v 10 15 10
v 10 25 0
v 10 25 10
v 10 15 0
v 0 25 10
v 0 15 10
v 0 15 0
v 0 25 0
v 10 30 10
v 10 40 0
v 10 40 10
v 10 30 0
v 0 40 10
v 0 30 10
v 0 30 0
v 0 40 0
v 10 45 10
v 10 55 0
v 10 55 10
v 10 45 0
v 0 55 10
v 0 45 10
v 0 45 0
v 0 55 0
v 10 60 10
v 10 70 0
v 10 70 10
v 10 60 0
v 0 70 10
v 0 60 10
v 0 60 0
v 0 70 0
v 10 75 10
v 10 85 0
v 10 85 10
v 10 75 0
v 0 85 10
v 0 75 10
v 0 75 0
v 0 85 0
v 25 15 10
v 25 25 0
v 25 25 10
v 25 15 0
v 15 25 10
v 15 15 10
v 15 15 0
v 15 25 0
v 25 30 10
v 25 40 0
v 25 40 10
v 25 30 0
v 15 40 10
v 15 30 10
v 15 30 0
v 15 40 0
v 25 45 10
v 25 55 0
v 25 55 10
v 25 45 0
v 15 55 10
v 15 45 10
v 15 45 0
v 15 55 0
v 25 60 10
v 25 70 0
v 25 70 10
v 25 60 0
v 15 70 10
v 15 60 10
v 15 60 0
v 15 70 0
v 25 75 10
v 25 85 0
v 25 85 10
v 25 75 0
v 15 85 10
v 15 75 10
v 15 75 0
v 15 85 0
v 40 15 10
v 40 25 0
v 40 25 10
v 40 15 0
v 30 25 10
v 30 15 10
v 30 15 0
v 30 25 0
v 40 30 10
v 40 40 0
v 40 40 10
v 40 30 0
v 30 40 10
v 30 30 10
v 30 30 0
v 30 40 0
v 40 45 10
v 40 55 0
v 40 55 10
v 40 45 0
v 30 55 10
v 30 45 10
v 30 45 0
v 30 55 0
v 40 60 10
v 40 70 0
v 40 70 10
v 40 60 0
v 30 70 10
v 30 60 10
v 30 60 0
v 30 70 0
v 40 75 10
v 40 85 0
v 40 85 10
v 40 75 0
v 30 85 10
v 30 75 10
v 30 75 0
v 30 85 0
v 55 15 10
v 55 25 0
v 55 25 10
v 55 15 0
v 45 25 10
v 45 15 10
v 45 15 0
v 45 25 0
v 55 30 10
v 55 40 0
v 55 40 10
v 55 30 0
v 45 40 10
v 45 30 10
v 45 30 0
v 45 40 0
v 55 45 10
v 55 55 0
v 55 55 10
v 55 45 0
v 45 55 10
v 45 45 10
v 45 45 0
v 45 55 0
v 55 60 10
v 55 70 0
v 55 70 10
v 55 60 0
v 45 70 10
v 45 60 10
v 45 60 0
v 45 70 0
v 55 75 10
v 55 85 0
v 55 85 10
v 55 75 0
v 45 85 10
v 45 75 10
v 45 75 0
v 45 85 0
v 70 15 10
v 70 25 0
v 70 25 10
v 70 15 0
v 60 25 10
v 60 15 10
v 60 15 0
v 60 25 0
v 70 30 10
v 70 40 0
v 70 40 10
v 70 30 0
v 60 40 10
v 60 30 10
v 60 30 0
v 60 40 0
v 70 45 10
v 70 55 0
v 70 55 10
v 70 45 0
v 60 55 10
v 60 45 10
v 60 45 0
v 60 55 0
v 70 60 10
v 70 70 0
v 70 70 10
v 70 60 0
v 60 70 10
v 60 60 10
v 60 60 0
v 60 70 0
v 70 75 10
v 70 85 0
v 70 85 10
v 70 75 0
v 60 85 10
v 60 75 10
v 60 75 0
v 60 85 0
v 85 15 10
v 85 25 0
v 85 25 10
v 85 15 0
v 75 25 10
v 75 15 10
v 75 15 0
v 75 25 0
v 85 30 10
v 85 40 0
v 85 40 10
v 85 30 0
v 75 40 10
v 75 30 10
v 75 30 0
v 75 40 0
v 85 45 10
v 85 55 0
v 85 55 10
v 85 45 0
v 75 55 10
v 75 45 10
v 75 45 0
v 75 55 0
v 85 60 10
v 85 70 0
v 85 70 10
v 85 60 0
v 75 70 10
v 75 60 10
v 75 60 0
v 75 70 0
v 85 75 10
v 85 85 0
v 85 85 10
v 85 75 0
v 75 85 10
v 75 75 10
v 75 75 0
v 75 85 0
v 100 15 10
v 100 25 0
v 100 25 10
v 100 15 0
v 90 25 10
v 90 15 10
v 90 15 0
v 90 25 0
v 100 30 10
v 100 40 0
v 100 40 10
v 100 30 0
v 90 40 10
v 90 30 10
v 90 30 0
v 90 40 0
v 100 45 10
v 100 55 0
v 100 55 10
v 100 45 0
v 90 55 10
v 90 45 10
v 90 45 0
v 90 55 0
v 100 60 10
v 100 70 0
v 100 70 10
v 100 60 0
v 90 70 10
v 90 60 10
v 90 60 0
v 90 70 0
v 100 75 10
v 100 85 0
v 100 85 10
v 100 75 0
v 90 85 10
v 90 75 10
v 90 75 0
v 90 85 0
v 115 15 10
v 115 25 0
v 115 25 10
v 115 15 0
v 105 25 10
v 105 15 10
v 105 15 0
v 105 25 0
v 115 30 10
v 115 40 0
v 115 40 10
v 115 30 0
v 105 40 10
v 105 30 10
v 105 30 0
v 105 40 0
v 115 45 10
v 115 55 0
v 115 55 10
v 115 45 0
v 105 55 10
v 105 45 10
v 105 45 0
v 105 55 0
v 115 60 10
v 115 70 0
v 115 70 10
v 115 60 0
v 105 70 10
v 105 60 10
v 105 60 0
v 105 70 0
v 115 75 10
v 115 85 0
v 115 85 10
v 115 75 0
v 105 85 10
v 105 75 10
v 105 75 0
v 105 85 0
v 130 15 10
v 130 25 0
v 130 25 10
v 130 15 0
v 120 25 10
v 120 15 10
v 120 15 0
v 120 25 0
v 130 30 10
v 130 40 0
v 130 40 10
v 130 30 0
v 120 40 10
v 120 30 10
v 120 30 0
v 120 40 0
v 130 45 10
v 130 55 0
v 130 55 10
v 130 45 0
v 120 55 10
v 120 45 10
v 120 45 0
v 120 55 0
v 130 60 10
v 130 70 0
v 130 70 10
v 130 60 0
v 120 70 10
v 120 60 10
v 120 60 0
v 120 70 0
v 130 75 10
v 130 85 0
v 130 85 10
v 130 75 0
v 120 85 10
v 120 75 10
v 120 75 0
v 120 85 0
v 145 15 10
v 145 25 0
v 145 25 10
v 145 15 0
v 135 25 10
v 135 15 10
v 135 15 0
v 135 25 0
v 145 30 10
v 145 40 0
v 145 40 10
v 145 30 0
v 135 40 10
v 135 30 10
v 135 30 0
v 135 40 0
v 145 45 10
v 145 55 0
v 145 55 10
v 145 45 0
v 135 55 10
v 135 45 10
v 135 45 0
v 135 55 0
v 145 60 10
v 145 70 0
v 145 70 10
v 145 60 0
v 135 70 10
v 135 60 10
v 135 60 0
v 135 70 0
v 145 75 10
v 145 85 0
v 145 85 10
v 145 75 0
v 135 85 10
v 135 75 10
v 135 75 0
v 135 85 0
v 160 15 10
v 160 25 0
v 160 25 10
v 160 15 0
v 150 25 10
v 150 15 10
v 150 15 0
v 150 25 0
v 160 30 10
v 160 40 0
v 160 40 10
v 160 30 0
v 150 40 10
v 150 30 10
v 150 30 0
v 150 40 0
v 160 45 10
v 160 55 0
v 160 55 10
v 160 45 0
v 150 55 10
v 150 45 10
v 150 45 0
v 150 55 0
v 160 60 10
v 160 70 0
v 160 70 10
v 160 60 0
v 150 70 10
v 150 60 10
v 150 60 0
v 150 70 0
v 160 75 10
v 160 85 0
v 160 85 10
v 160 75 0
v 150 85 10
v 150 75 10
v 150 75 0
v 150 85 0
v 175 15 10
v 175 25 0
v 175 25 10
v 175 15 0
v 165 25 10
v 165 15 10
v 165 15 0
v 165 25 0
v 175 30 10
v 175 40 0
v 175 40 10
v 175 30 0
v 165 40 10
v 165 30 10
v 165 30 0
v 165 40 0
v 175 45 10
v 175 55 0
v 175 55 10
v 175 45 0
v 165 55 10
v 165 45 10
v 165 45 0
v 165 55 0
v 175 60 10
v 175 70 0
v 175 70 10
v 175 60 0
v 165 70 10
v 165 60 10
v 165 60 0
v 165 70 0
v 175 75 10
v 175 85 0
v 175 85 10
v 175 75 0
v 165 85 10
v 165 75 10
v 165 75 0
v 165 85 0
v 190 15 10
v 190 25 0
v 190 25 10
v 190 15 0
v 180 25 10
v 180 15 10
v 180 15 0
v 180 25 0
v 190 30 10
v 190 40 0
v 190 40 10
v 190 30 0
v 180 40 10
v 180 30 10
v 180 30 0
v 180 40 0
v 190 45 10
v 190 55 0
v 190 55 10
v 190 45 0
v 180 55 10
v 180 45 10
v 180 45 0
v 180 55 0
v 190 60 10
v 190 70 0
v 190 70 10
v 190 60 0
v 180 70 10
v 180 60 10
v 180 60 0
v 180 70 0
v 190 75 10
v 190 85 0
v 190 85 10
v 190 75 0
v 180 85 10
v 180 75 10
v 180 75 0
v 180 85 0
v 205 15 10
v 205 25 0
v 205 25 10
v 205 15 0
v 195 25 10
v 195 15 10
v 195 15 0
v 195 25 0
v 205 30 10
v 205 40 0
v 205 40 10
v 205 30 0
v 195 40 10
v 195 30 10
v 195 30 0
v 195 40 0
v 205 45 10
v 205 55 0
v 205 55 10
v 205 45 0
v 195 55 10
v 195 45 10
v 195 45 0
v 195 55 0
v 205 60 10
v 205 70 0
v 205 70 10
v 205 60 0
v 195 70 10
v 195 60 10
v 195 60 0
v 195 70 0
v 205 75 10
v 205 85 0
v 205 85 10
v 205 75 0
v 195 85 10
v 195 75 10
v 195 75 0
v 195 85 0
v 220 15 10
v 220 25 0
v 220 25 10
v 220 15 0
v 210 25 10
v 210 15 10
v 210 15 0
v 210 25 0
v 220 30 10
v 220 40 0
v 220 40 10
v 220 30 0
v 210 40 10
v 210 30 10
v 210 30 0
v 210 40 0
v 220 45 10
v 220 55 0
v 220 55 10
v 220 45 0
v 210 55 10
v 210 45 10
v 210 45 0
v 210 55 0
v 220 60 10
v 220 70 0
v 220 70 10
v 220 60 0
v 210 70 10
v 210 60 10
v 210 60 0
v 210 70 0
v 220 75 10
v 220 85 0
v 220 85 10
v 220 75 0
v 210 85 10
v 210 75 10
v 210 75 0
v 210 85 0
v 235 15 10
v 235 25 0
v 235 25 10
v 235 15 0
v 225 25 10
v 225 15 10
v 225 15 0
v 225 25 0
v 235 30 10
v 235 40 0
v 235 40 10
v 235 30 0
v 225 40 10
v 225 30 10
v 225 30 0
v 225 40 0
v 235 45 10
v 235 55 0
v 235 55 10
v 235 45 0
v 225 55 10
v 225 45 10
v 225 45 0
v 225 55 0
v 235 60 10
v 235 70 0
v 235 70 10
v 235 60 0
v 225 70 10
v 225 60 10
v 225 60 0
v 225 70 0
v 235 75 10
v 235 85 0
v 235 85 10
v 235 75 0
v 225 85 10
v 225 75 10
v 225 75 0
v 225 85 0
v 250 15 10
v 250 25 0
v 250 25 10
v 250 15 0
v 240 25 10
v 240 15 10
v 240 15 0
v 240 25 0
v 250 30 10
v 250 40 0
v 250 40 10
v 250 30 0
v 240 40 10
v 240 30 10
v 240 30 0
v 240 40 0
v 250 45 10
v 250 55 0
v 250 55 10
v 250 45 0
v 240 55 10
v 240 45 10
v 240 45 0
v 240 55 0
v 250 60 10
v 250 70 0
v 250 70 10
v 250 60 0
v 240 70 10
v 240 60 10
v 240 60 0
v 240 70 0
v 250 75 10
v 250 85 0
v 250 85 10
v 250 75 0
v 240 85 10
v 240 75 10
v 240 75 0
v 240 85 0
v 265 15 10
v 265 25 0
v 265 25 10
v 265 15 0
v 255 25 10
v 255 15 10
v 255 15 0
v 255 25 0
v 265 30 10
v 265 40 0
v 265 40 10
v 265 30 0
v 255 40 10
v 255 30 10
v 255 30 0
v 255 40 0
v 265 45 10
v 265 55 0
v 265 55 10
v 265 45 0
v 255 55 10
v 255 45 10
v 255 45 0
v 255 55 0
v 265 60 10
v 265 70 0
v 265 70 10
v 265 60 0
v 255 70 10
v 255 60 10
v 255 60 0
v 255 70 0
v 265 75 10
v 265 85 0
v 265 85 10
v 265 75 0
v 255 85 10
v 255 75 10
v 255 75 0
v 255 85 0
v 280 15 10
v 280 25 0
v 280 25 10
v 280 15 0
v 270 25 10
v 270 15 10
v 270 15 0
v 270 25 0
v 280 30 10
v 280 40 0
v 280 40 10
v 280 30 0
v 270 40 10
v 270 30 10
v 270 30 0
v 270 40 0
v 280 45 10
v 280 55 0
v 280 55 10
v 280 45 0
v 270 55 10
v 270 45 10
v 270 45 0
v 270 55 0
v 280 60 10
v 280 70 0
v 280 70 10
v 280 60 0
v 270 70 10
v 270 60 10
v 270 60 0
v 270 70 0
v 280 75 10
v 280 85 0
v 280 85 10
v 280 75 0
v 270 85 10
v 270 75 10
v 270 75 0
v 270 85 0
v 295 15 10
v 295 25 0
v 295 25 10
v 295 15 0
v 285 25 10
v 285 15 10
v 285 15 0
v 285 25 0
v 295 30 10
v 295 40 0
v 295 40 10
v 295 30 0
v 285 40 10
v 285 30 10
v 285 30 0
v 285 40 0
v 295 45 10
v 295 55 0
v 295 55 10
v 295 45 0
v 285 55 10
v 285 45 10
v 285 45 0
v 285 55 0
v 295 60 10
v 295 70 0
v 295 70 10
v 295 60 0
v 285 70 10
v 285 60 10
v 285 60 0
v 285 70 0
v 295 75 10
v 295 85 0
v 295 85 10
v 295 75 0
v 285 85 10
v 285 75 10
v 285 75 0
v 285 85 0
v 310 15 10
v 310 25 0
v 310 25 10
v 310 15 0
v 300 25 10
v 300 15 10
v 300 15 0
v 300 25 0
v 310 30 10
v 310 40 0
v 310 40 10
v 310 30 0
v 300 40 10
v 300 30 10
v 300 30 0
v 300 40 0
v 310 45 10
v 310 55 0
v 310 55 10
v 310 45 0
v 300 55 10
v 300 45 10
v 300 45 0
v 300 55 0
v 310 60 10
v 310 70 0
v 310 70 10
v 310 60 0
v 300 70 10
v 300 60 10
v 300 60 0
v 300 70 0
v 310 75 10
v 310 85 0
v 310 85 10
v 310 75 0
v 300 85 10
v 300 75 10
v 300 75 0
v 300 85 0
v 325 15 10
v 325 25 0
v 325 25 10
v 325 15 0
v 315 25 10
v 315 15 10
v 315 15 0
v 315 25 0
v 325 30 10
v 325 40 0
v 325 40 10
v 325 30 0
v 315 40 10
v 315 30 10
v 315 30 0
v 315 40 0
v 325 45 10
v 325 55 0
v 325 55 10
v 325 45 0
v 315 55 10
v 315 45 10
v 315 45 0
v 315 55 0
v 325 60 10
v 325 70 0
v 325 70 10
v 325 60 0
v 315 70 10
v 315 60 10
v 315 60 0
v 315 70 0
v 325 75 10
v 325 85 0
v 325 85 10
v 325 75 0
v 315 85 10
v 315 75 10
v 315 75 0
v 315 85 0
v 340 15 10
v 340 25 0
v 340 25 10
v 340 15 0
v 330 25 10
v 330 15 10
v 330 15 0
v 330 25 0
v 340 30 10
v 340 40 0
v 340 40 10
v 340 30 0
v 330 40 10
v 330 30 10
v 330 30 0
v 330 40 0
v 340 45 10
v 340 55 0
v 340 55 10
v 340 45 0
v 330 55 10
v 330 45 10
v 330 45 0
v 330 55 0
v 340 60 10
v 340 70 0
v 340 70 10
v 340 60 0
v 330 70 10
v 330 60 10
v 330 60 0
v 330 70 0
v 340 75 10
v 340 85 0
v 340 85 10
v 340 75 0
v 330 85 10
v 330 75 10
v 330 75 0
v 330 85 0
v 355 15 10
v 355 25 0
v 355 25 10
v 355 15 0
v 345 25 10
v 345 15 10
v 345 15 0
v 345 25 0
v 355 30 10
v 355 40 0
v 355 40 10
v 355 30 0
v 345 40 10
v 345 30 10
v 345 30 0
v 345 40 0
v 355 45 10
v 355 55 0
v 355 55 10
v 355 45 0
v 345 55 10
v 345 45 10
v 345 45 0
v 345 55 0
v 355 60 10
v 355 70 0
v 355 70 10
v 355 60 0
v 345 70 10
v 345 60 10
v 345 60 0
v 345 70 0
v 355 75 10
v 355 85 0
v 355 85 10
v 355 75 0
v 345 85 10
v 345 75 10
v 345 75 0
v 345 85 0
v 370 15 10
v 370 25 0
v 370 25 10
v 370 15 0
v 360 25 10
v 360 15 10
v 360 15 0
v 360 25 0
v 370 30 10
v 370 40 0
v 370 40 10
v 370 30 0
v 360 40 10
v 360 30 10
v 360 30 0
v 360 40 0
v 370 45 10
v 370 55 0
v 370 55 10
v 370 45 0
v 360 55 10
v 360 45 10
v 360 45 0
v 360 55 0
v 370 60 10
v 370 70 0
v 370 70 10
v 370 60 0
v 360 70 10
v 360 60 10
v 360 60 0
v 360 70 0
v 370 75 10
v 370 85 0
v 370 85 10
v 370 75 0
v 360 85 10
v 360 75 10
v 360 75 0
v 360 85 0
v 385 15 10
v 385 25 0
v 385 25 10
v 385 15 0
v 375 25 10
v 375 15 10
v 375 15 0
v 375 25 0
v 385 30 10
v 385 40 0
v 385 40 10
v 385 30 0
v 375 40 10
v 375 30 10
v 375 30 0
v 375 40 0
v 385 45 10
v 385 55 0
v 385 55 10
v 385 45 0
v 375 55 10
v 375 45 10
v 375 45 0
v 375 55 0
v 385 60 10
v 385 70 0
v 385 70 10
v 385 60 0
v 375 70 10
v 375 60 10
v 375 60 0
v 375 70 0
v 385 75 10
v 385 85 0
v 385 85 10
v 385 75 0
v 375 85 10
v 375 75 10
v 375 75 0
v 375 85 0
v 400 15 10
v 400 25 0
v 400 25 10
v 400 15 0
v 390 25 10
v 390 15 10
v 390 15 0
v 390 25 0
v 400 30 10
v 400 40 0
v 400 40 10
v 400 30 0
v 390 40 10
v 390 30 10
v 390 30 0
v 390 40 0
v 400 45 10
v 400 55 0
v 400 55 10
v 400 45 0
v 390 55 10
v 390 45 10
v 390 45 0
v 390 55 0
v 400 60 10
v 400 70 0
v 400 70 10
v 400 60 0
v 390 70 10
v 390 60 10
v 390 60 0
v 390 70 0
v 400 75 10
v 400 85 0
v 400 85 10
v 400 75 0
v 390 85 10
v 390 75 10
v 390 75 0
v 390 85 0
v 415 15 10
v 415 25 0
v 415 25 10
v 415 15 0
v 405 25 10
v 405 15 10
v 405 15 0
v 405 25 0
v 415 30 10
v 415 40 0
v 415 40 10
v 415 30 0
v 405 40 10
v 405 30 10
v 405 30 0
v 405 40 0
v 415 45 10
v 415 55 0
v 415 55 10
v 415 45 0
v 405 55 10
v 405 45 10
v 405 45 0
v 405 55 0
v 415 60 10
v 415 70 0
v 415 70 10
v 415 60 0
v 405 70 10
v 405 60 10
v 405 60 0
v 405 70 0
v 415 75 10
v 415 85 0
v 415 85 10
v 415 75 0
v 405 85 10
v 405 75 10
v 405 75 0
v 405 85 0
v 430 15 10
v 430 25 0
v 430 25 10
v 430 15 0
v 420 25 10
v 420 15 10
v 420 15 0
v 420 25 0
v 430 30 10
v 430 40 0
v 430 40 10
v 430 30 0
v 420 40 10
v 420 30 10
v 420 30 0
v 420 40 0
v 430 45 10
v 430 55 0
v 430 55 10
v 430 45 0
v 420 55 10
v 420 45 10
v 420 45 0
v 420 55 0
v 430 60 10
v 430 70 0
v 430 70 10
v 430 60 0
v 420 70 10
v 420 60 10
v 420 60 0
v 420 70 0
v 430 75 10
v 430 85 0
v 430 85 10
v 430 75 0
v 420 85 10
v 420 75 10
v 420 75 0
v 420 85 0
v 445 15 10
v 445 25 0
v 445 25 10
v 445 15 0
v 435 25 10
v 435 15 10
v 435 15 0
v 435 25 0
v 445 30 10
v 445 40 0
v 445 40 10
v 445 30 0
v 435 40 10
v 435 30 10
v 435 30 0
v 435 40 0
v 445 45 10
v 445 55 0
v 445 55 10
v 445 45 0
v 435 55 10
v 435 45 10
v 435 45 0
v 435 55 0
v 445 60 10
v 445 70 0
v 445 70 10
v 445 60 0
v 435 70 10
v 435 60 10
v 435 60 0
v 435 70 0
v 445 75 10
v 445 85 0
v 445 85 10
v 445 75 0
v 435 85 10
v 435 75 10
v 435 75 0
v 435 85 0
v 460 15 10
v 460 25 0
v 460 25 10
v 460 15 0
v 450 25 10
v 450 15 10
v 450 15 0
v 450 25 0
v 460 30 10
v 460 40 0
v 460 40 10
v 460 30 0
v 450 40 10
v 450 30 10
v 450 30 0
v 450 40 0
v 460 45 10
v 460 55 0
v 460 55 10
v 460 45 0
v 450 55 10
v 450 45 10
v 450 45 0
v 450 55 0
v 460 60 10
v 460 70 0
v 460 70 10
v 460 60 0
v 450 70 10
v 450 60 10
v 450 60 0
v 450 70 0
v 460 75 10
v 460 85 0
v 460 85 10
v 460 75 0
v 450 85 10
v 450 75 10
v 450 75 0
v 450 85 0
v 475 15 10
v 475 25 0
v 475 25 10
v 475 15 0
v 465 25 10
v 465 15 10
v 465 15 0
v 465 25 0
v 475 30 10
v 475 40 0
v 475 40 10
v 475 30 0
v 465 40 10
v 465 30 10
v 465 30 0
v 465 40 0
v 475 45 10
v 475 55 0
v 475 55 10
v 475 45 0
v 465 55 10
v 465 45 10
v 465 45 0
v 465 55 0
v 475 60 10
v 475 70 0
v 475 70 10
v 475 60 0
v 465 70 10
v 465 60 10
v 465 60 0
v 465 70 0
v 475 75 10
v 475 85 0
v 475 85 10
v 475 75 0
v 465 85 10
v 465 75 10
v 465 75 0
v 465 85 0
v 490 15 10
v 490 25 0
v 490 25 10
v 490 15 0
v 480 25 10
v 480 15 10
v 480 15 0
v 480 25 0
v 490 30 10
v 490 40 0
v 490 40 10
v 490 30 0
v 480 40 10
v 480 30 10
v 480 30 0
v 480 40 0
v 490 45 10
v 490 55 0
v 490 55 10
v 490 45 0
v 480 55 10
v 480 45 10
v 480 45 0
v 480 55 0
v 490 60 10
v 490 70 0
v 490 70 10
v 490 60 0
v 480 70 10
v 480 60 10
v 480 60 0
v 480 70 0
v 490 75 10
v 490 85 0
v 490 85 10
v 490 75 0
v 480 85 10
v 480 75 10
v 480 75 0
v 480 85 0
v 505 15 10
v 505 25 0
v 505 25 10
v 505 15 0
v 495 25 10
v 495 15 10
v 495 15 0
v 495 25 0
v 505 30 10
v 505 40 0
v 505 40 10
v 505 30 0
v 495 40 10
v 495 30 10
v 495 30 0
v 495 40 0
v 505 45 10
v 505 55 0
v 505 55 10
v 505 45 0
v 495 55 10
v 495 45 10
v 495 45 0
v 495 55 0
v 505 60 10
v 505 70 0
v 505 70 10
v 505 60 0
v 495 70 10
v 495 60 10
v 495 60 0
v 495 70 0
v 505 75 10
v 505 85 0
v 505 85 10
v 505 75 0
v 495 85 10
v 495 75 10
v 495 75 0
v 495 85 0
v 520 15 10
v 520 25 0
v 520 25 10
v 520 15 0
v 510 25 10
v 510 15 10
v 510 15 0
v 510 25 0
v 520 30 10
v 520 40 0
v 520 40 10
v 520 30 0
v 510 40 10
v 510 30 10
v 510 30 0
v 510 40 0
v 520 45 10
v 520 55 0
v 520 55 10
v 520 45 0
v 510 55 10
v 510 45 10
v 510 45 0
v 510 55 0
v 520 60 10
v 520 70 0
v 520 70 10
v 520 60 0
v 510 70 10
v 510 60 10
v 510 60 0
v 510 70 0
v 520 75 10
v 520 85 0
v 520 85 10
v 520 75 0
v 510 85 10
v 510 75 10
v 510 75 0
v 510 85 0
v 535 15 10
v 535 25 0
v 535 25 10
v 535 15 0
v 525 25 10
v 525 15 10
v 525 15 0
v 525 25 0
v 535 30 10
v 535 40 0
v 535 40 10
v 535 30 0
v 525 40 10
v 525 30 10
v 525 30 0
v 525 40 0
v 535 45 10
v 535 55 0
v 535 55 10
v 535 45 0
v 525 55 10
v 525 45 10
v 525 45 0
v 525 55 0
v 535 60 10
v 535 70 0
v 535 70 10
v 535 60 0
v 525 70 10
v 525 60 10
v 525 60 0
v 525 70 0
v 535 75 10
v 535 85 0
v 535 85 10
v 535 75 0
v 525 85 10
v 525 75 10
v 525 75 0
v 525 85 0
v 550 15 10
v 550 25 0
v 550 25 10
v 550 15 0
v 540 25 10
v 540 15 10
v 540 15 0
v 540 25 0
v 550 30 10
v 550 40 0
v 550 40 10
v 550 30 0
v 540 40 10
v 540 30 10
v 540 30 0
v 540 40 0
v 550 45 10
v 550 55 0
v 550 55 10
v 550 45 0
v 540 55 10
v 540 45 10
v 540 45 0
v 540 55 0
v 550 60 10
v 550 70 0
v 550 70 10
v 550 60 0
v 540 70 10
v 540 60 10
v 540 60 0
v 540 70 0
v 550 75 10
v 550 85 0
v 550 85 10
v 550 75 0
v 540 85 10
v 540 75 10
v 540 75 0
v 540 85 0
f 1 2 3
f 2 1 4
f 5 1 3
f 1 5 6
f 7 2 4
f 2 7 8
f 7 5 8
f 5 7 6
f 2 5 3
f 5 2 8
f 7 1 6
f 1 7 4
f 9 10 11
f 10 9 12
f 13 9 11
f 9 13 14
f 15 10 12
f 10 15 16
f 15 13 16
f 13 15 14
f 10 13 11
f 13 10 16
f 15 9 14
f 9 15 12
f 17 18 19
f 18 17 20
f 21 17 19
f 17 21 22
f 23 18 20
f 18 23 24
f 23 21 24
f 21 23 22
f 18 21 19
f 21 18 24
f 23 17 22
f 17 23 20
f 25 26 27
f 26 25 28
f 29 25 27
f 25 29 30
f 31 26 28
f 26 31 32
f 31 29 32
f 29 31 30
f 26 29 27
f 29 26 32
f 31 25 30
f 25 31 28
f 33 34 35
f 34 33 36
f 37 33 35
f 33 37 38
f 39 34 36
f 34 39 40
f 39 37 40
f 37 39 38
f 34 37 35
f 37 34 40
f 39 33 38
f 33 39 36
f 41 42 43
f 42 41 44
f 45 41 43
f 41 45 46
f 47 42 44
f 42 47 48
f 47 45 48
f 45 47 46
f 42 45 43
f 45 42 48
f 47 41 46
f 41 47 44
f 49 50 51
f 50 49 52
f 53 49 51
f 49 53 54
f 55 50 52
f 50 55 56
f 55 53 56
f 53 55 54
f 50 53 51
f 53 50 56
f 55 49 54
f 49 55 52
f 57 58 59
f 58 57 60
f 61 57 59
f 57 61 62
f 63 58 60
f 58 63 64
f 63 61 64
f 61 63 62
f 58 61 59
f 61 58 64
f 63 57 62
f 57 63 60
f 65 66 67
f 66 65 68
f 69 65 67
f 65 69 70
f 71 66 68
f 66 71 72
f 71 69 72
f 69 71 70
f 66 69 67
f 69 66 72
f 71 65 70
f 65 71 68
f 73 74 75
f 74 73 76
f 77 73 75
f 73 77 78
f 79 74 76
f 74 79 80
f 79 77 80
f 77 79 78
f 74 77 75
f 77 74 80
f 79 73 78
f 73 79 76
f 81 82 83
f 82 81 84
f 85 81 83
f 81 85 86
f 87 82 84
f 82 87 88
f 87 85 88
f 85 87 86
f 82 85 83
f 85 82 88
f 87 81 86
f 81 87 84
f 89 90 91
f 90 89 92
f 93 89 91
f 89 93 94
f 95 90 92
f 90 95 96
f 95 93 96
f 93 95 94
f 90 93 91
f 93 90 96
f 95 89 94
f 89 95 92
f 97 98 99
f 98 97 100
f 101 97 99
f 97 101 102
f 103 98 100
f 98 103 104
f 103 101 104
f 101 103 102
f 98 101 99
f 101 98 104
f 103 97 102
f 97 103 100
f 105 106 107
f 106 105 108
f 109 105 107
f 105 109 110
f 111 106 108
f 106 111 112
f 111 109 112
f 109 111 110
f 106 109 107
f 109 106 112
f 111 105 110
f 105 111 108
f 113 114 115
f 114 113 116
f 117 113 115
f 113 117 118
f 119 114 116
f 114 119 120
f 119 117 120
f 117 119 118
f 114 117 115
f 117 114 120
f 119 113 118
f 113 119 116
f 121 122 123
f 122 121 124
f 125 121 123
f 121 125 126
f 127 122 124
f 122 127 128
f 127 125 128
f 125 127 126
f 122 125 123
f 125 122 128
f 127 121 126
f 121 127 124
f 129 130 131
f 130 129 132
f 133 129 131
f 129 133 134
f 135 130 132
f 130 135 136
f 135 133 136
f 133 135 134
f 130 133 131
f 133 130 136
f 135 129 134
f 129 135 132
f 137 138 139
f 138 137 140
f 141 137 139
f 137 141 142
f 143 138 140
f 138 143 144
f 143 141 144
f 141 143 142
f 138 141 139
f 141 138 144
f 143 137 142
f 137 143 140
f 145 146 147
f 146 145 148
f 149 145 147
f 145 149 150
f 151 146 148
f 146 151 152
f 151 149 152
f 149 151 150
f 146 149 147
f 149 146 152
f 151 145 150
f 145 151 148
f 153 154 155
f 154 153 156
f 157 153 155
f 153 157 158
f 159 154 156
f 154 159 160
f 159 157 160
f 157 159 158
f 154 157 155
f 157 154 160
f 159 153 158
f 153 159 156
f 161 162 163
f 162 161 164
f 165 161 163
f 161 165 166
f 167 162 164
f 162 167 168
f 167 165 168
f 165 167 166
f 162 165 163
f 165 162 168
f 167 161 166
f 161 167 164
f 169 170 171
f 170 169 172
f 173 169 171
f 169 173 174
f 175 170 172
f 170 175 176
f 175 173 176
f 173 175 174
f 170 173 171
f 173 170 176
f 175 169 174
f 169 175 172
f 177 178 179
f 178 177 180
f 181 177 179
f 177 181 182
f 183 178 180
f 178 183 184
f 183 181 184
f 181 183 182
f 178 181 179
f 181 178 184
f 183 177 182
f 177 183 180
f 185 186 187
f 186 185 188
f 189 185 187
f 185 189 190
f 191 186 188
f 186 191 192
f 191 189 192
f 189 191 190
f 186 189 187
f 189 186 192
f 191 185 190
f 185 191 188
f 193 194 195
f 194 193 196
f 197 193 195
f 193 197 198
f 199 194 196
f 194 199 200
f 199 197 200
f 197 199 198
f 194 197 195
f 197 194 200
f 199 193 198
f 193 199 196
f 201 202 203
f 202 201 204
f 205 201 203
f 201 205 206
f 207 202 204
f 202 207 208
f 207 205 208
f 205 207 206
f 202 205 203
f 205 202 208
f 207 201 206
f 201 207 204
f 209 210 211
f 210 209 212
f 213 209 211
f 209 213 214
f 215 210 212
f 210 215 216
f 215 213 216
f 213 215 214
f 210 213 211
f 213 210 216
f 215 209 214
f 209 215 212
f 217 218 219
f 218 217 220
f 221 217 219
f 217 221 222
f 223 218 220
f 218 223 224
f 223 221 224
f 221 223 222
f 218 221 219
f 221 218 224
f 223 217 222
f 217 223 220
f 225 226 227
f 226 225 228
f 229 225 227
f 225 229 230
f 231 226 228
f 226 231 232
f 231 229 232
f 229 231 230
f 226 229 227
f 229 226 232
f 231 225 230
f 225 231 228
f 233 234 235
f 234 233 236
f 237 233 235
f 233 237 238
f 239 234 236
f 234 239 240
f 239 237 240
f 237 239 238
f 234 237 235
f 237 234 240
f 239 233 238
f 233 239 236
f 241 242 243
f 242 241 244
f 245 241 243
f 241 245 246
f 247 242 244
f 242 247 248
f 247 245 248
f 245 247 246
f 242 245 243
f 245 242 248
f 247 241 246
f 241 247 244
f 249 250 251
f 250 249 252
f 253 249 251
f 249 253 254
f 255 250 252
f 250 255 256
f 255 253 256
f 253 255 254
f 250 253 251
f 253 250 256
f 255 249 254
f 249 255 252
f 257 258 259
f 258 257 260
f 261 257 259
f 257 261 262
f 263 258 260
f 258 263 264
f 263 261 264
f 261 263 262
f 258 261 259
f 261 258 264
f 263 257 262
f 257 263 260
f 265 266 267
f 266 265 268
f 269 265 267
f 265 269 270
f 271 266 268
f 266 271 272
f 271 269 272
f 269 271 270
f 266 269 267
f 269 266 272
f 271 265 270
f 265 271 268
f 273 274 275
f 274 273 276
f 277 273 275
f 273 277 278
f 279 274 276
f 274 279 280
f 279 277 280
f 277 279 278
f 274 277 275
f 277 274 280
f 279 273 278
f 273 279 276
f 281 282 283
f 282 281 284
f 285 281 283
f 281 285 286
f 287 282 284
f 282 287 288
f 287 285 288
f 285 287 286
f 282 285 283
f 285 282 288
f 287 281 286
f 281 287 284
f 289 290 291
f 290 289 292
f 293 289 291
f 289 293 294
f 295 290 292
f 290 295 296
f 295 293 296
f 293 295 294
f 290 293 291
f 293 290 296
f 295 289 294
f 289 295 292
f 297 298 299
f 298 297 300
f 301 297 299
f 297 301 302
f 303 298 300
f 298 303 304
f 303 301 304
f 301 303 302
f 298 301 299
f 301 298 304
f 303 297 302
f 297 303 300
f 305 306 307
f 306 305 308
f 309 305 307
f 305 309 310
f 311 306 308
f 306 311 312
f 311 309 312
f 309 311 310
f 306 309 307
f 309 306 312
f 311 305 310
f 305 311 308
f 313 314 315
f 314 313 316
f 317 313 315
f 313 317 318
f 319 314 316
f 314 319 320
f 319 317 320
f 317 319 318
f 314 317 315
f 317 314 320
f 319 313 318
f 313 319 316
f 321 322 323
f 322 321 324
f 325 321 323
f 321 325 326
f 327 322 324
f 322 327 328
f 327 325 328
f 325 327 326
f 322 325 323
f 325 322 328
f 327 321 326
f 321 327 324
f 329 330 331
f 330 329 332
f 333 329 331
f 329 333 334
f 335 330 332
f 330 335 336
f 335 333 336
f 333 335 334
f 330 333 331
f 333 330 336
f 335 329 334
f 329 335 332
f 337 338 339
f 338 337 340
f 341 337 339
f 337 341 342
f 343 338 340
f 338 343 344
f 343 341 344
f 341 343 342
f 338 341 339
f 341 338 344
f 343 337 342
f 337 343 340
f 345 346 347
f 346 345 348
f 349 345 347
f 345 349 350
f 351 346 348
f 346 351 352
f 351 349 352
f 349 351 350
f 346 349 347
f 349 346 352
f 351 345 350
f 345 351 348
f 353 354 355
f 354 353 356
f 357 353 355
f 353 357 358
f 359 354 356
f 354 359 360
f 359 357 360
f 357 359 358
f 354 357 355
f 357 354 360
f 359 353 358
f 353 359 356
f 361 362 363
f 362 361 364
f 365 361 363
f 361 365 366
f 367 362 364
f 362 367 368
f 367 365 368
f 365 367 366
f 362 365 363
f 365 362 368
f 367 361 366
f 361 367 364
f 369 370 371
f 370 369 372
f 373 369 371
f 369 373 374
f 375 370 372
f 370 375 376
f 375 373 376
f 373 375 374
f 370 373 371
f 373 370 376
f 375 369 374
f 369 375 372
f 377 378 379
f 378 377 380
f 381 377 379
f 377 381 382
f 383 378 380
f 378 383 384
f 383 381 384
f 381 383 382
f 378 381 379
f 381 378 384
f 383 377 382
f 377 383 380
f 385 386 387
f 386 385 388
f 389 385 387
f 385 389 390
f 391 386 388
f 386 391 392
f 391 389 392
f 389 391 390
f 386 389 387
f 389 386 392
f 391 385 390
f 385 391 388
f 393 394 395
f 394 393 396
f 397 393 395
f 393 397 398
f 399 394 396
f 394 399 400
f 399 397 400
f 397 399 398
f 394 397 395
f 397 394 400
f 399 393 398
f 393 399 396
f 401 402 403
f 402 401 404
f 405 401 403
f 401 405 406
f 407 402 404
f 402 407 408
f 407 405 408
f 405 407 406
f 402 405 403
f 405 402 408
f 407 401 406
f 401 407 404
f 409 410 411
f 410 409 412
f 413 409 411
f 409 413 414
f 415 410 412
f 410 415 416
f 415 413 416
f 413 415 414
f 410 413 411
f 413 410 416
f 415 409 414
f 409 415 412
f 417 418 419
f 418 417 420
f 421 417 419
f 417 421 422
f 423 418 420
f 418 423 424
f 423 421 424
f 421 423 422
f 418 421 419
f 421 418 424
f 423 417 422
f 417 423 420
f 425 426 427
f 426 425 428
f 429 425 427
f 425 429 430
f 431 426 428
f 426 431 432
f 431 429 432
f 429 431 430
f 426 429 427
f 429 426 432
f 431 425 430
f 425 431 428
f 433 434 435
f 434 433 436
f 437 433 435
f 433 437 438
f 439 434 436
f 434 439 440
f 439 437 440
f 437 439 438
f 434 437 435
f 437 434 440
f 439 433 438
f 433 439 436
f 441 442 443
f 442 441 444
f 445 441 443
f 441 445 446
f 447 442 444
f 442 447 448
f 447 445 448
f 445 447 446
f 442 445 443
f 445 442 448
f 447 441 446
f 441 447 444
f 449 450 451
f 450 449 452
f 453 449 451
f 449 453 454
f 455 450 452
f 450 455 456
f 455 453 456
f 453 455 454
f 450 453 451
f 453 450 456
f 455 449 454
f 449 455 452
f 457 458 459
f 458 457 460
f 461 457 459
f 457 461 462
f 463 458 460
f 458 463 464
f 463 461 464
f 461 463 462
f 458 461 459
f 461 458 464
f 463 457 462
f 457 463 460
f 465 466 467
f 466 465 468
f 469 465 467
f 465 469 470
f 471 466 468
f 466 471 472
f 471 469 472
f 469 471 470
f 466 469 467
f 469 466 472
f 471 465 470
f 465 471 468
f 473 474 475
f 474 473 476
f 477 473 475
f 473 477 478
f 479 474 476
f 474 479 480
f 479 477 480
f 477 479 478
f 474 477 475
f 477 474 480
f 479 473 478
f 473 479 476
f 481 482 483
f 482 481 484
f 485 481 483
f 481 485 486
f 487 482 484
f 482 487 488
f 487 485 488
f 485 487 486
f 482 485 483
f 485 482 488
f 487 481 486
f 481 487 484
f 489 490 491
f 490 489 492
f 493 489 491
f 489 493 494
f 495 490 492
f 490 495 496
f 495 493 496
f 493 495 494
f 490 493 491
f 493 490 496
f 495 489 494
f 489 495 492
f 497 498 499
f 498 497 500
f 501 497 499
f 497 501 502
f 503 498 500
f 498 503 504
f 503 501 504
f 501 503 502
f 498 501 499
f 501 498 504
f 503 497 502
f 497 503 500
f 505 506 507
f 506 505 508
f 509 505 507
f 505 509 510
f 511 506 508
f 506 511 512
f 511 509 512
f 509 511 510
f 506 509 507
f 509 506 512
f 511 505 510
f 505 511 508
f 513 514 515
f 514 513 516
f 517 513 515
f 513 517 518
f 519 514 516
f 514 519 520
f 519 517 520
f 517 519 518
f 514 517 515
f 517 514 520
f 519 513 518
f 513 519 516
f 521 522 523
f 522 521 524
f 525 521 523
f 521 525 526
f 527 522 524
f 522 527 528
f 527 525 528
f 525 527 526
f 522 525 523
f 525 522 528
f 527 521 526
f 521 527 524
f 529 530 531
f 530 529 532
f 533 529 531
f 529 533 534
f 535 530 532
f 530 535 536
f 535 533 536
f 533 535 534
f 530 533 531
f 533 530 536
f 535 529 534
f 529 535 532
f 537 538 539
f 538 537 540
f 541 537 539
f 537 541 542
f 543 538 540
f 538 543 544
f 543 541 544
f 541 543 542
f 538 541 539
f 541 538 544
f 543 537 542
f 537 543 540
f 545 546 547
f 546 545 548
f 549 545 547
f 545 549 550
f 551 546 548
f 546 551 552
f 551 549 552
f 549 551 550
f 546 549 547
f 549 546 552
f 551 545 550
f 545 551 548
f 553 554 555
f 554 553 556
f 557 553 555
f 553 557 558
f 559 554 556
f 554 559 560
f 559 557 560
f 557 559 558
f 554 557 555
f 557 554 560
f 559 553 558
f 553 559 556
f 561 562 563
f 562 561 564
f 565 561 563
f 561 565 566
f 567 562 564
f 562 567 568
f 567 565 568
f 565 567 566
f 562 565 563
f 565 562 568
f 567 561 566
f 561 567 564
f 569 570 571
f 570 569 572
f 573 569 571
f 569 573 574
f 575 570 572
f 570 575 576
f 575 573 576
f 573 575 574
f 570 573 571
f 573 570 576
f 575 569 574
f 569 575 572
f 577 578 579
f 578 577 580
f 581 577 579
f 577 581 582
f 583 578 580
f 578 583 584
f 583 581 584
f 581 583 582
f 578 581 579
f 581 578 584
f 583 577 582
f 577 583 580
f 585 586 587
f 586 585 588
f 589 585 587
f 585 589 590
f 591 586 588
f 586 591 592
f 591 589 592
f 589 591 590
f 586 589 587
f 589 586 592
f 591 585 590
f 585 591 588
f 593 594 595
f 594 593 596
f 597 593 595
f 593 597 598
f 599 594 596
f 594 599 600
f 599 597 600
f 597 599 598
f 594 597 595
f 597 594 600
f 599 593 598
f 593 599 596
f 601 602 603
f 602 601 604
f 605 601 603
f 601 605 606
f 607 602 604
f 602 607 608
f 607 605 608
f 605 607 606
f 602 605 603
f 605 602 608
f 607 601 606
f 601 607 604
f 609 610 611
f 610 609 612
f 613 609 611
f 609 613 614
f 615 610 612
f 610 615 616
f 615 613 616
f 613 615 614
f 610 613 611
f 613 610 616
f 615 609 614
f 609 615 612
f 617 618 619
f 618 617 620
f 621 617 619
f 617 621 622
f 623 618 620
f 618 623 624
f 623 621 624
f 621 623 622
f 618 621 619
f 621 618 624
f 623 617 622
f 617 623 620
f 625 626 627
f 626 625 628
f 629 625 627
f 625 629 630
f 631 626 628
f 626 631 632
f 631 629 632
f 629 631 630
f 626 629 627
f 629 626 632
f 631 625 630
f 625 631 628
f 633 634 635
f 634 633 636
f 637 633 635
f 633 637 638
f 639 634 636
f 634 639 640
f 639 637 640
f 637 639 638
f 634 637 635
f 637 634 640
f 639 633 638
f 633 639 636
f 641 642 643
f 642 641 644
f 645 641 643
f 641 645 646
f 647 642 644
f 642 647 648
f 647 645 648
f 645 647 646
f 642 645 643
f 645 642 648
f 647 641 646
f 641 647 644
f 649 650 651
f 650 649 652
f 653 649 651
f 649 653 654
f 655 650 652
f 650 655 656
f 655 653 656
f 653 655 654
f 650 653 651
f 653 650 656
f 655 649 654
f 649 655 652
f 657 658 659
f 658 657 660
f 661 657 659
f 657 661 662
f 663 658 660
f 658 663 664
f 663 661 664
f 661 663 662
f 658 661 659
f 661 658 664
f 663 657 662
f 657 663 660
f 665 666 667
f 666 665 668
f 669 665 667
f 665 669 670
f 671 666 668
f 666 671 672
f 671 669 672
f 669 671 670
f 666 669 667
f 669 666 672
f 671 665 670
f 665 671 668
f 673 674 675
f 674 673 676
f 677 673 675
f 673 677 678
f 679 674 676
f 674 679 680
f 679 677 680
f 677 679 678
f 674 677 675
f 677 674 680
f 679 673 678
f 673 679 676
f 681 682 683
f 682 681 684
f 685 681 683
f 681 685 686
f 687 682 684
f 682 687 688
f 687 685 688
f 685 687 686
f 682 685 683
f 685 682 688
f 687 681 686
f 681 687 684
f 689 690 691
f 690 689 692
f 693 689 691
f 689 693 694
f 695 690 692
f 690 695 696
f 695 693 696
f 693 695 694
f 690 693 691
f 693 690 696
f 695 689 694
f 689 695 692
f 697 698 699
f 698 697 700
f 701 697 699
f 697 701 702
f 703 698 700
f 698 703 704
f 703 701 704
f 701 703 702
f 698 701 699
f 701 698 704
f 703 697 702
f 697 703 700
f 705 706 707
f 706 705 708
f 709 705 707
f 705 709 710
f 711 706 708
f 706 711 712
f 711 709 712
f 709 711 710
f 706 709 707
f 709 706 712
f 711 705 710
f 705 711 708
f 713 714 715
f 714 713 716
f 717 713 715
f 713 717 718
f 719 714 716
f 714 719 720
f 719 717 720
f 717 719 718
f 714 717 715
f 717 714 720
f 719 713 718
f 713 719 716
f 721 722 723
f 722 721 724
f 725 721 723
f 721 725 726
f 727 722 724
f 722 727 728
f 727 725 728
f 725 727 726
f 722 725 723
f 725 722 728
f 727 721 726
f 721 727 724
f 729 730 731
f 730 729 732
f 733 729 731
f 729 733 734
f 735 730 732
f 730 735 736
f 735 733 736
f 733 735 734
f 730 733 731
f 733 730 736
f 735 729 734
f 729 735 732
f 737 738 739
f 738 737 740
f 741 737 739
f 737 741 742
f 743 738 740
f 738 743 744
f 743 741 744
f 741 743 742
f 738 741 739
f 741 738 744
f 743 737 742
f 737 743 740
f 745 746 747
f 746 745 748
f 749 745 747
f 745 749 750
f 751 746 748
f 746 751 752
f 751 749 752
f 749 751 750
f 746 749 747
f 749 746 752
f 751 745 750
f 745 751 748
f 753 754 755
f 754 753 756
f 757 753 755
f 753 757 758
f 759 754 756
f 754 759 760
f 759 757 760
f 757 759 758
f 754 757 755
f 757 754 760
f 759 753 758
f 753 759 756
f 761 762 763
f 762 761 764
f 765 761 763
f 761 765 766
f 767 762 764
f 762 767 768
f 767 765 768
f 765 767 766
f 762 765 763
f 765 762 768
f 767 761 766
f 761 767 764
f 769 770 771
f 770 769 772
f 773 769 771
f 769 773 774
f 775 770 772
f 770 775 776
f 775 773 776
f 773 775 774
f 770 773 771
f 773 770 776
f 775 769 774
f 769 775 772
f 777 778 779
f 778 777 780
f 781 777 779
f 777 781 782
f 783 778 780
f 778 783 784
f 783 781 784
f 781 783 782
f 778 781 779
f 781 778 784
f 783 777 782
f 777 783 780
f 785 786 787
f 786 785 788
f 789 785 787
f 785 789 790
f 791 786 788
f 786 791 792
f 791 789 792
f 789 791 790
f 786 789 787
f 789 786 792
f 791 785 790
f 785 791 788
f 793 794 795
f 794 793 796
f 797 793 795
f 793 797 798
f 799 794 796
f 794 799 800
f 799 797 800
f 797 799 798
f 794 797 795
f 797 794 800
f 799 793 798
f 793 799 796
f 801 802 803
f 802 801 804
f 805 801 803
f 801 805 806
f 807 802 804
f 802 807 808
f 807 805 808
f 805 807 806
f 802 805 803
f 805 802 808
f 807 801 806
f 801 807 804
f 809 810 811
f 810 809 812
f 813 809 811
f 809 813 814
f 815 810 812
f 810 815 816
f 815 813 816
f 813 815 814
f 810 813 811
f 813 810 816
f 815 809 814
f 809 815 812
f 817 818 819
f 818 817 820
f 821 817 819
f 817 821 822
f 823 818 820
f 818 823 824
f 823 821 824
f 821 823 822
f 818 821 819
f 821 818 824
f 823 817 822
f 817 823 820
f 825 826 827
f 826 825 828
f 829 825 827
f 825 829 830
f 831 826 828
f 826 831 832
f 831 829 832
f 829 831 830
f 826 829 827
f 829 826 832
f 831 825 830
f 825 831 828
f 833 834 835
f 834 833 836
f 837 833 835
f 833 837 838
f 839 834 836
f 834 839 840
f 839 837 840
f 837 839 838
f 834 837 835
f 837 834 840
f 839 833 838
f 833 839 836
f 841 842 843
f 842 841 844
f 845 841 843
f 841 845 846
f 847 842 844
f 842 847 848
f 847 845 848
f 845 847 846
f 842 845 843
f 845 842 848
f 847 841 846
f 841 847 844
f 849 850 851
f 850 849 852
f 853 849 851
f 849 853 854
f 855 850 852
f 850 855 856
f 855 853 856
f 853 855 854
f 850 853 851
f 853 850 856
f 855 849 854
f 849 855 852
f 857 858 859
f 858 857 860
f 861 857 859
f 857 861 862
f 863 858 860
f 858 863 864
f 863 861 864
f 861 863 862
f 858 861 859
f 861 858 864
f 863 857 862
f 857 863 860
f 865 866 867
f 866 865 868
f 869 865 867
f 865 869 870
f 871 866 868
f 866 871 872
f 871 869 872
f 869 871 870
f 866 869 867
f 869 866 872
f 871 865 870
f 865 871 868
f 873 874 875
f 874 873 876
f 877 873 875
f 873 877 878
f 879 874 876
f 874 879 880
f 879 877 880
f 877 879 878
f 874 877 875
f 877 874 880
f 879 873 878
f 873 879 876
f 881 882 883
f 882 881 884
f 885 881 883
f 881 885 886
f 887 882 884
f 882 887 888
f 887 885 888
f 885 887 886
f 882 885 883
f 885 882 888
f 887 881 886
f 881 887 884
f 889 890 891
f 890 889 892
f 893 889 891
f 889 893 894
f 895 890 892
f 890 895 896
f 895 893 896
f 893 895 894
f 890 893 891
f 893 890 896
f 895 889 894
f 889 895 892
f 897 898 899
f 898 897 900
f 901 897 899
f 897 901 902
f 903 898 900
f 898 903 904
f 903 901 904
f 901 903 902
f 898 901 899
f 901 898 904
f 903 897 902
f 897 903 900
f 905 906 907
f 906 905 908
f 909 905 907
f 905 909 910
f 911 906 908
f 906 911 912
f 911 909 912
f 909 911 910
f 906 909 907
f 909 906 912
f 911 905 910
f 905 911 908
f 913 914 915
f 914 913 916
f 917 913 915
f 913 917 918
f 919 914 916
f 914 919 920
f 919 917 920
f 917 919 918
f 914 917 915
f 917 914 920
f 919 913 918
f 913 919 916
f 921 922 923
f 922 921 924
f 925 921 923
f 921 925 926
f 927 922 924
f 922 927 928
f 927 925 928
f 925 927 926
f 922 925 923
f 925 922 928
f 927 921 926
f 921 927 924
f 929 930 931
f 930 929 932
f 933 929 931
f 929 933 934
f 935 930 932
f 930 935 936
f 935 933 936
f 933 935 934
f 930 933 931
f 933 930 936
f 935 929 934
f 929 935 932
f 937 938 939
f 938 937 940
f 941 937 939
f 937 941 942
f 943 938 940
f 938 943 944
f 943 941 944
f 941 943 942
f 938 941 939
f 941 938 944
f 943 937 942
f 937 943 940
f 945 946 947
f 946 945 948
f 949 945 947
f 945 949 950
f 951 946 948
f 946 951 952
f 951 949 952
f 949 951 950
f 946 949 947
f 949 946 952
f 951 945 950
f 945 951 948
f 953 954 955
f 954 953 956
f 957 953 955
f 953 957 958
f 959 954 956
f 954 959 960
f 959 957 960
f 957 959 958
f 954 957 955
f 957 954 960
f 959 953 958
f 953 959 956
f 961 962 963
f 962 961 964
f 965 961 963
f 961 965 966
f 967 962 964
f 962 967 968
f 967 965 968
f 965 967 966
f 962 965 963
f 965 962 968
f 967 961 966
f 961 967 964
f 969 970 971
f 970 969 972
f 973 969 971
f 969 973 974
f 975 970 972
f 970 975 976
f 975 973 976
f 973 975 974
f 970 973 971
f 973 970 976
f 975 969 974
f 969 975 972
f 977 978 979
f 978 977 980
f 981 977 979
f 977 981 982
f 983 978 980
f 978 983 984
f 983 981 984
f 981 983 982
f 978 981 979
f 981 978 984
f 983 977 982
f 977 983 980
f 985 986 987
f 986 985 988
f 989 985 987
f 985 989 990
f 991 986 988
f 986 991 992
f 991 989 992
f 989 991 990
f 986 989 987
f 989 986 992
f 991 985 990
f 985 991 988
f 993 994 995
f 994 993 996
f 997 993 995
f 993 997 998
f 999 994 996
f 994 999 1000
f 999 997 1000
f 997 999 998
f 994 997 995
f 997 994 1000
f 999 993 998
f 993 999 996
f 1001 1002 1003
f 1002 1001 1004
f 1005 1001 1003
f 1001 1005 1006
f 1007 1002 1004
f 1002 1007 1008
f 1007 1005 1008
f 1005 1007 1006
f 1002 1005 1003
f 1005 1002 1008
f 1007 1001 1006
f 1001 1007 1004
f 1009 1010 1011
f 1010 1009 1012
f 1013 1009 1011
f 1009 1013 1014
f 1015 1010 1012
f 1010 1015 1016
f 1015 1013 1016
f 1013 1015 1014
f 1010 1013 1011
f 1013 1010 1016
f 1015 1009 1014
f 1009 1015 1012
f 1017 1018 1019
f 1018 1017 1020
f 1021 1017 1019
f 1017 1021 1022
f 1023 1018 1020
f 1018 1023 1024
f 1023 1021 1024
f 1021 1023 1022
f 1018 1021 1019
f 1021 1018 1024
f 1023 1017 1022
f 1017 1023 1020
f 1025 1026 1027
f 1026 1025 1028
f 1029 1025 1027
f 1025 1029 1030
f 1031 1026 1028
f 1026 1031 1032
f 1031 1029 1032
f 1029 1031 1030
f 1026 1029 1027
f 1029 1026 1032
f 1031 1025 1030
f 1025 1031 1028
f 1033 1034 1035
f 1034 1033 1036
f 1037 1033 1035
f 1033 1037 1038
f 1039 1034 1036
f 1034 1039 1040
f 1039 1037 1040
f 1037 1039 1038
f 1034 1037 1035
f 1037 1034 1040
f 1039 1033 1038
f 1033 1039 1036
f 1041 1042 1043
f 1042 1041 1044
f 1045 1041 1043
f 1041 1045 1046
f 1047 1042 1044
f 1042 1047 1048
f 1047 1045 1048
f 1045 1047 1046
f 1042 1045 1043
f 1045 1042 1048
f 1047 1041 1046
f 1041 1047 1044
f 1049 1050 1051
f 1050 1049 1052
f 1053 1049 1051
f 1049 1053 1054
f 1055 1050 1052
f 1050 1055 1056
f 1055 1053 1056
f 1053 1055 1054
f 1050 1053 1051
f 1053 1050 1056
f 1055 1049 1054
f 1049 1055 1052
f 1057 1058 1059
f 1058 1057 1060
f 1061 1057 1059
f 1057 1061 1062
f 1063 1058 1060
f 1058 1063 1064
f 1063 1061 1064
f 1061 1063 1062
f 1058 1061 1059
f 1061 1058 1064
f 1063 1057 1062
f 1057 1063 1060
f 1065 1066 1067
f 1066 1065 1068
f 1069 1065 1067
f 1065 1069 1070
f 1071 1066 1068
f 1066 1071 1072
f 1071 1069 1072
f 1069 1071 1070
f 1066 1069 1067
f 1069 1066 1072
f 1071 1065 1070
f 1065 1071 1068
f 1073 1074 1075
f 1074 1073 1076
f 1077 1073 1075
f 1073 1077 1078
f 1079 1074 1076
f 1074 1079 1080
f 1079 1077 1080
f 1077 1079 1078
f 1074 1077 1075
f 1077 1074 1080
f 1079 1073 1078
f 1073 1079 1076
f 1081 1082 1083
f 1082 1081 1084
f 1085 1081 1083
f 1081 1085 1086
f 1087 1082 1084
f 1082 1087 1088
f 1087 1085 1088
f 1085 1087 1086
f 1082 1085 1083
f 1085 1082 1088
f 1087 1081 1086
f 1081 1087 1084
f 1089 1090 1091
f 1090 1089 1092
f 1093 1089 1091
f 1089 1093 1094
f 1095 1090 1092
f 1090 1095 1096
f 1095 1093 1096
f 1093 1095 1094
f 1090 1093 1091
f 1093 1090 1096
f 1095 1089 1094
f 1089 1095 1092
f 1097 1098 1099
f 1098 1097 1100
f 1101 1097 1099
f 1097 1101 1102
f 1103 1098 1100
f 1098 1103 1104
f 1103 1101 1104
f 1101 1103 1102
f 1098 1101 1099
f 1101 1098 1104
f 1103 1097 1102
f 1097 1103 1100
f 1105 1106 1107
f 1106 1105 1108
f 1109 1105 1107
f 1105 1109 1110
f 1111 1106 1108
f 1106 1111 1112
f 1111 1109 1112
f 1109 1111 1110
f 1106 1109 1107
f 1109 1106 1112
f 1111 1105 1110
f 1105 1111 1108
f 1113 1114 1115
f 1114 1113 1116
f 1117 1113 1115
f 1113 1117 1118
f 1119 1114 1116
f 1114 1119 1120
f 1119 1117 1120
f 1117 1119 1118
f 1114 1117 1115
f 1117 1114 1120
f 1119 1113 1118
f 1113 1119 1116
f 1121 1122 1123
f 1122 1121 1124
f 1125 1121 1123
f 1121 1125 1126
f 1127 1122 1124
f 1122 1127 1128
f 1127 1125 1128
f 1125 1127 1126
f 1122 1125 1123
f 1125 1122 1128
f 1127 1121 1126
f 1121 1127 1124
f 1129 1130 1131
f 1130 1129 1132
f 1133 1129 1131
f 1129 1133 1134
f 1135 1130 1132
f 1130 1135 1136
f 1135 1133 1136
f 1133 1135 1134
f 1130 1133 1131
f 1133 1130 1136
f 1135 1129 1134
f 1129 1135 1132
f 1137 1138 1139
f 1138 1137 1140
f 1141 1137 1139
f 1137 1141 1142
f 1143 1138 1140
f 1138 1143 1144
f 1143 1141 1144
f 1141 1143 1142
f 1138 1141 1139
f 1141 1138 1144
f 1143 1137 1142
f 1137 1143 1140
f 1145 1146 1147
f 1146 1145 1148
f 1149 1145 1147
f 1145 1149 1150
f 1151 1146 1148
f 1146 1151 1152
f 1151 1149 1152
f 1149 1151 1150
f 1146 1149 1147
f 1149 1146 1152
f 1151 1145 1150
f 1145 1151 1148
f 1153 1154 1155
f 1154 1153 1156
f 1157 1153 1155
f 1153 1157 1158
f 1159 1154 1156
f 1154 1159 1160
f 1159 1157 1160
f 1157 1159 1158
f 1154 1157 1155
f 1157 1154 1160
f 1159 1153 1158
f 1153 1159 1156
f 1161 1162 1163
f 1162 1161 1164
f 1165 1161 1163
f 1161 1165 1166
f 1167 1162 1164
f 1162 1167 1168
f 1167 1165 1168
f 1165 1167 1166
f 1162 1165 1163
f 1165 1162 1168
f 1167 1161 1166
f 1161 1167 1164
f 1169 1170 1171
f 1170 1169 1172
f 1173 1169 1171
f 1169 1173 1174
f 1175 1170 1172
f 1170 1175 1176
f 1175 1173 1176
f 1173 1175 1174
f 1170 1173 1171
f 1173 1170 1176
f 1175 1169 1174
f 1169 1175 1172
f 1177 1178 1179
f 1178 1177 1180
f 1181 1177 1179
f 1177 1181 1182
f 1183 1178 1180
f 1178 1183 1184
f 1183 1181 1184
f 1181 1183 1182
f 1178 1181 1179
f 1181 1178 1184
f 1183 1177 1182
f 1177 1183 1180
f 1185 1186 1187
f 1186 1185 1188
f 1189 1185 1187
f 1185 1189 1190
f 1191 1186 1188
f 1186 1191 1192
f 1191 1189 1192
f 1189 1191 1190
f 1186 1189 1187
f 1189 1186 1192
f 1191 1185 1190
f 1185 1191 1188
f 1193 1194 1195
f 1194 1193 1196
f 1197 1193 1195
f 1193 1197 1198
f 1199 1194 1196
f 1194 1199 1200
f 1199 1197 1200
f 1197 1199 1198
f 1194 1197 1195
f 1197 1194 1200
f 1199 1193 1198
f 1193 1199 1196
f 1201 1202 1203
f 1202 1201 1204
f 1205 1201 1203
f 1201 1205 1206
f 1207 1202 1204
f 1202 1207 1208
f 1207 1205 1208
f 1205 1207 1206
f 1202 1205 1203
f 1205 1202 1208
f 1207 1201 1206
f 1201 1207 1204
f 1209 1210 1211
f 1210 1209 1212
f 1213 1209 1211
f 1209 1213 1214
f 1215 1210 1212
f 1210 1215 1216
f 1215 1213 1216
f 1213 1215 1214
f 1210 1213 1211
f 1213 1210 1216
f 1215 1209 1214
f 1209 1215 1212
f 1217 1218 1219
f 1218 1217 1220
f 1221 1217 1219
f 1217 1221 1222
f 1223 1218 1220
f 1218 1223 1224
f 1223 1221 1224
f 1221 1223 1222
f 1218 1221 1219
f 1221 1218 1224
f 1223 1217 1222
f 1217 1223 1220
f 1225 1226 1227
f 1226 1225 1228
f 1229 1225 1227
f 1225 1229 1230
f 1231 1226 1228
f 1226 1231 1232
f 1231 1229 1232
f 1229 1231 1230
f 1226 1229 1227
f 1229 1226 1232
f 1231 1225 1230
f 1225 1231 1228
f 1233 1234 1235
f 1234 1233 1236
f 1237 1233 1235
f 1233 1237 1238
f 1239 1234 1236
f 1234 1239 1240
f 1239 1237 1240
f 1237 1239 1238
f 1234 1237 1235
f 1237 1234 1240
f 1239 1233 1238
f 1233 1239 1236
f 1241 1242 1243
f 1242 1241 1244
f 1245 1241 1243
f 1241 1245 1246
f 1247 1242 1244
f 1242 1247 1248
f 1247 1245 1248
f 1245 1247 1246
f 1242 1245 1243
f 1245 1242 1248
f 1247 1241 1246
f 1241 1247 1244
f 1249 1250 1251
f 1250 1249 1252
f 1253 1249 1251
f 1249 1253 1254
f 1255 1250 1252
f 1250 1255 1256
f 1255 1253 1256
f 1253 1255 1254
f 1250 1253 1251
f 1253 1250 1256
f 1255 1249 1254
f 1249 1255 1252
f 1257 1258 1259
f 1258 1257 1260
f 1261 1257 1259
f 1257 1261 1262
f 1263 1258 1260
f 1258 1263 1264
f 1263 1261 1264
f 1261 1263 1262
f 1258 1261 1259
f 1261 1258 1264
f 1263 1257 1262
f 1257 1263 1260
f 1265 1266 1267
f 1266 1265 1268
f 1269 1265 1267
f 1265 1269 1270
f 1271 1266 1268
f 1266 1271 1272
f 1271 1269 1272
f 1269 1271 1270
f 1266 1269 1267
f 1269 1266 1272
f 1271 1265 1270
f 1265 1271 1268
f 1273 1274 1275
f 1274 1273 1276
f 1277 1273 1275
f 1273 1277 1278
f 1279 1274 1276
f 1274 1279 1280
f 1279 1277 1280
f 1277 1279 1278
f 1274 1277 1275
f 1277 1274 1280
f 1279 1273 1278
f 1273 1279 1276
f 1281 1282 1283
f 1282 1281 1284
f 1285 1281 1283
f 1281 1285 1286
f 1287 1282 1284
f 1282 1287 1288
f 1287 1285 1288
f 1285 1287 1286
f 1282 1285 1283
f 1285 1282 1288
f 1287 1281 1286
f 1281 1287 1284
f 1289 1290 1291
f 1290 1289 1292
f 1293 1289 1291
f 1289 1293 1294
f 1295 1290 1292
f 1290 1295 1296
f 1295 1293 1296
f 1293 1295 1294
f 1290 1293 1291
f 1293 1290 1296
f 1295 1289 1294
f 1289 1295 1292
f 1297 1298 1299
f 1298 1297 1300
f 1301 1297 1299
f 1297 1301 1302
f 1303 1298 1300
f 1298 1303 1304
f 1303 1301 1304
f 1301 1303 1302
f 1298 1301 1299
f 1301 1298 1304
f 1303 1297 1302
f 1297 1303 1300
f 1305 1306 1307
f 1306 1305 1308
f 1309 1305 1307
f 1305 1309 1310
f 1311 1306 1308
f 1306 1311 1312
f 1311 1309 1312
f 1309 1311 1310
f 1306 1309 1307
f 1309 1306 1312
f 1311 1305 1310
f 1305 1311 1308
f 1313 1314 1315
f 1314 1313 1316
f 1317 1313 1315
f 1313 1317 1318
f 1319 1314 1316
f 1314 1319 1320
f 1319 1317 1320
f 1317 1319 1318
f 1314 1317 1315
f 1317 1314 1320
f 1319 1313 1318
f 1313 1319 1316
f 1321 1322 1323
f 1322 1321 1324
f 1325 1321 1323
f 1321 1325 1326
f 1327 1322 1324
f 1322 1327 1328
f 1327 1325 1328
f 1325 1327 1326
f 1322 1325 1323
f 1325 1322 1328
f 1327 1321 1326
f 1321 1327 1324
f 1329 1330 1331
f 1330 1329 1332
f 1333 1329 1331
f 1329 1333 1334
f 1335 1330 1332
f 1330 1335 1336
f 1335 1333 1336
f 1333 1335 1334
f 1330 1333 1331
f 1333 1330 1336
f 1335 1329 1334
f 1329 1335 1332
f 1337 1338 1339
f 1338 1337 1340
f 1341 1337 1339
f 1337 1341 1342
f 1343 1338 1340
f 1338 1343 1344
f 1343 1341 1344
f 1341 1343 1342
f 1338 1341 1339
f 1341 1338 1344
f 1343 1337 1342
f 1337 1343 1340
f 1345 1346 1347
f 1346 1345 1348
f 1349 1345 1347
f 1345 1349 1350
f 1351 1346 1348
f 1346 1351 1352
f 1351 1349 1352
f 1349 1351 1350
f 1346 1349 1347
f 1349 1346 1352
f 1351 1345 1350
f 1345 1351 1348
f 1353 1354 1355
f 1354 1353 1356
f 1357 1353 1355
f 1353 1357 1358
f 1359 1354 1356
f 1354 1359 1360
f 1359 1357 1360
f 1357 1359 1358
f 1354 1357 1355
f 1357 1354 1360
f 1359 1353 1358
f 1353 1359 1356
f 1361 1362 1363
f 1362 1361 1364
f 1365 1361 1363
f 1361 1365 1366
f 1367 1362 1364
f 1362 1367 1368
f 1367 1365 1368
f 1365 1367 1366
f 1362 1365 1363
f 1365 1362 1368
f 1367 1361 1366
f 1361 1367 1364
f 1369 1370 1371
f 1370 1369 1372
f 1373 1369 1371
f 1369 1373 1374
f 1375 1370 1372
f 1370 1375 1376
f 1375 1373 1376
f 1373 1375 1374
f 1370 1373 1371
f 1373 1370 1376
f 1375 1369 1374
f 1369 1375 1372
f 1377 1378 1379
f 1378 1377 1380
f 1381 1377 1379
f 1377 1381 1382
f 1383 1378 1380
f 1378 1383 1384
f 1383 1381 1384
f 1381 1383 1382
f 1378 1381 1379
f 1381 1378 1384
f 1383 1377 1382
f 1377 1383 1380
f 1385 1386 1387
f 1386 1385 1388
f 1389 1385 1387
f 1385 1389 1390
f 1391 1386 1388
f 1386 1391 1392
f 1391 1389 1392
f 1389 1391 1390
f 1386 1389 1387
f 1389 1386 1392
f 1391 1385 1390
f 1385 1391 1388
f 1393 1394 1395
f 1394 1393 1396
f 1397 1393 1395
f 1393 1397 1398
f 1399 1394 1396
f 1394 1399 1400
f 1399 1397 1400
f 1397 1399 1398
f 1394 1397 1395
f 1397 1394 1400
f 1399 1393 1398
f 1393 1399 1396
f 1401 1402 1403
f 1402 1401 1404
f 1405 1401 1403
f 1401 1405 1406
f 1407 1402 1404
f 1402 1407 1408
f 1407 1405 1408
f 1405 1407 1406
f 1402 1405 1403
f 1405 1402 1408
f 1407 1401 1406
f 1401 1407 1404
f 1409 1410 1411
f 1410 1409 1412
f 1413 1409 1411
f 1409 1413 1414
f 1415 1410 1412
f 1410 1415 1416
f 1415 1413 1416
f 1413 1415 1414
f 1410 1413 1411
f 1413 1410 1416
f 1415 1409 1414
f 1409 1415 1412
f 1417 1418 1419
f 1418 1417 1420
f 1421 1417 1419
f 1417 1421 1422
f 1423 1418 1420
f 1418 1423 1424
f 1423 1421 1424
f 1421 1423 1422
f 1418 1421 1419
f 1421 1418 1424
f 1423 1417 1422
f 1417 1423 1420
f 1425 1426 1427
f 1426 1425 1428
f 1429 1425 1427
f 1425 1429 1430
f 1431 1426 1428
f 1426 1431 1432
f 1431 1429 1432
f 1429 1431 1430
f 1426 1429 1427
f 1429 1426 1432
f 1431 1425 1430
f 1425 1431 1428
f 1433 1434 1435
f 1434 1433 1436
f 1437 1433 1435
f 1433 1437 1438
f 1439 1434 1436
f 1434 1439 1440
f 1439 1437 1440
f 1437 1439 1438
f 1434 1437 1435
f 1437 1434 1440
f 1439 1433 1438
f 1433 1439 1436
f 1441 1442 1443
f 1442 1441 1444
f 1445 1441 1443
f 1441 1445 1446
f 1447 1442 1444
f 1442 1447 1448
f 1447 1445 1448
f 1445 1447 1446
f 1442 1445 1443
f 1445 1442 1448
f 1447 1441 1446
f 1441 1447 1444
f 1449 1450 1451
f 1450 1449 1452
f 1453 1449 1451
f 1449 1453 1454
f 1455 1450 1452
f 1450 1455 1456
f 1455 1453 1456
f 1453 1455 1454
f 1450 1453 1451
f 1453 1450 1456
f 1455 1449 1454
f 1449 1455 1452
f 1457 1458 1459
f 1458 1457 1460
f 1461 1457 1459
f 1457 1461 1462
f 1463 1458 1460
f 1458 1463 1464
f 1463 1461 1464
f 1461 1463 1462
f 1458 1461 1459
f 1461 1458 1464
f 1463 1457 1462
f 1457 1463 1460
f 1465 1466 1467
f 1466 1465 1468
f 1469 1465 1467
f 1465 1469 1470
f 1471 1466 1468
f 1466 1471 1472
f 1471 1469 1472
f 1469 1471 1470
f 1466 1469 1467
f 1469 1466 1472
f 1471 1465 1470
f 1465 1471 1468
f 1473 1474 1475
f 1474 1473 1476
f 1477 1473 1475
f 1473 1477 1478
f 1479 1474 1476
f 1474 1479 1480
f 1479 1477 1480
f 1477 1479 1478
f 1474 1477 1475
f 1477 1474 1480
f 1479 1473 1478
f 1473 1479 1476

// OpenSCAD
// transmission function estimation

// this script displays cubes with various colors on screen.
// horizontal axis is hue, 0 ... 360 in steps of 10 degree
// vertical axis is saturation, 0.20 ... 1.00 in steps of 0.2

// measure transmission function of filter this way:
// close right eye, and look at drawing through left (red) filter of 3D anaglyph glasses.
// for every column, mark the lowest square which is invisible.
// this gives the transmission function for the left (red) filter.
// repeat for right (cyan) filter.

// set viewport
$vpt=[275, 50, 5];
$vpr=[0, 0, 0];
$vpd=1000;

function hsv(h, s, v) = hsv1(h/360,s/100,v/100, 1);
function hsv1(h, s = 1, v = 1, a = 1, p, q, t) = (p == undef || q == undef || t == undef) // by LightAtPlay
	? hsv1(
		(h%1) * 6,
		s<0?0:s>1?1:s,
		v<0?0:v>1?1:v,
		a,
		(v<0?0:v>1?1:v) * (1 - (s<0?0:s>1?1:s)),
		(v<0?0:v>1?1:v) * (1 - (s<0?0:s>1?1:s) * ((h%1)*6-floor((h%1)*6))),
		(v<0?0:v>1?1:v) * (1 - (s<0?0:s>1?1:s) * (1 - ((h%1)*6-floor((h%1)*6))))
	)
	:
	h < 1 ? [v,t,p,a] :
	h < 2 ? [q,v,p,a] :
	h < 3 ? [p,v,t,a] :
	h < 4 ? [p,q,v,a] :
	h < 5 ? [t,p,v,a] :
	        [v,p,q,a];

// x axis is hue, y axis is saturation
for (h = [0:10:360]) {
  for (s = [20:20:100]) {
    translate([h*1.5, s/20*15, 0])
    color(hsv(h, s, 100))
    cube(10);
  }
}

// hue in degrees
for (h = [0:10:360]) {
    translate([h*1.5+5, -20, 0])
    rotate([0, 0, 90])
    color("LightGrey")
    text(str(h), valign="center");
}

// draw 5% grey background
if (0)
translate([-10, 5, -20])
color(hsv(0, 0, 95))
cube([38*15, 6*15, 10]); 
// not truncated
